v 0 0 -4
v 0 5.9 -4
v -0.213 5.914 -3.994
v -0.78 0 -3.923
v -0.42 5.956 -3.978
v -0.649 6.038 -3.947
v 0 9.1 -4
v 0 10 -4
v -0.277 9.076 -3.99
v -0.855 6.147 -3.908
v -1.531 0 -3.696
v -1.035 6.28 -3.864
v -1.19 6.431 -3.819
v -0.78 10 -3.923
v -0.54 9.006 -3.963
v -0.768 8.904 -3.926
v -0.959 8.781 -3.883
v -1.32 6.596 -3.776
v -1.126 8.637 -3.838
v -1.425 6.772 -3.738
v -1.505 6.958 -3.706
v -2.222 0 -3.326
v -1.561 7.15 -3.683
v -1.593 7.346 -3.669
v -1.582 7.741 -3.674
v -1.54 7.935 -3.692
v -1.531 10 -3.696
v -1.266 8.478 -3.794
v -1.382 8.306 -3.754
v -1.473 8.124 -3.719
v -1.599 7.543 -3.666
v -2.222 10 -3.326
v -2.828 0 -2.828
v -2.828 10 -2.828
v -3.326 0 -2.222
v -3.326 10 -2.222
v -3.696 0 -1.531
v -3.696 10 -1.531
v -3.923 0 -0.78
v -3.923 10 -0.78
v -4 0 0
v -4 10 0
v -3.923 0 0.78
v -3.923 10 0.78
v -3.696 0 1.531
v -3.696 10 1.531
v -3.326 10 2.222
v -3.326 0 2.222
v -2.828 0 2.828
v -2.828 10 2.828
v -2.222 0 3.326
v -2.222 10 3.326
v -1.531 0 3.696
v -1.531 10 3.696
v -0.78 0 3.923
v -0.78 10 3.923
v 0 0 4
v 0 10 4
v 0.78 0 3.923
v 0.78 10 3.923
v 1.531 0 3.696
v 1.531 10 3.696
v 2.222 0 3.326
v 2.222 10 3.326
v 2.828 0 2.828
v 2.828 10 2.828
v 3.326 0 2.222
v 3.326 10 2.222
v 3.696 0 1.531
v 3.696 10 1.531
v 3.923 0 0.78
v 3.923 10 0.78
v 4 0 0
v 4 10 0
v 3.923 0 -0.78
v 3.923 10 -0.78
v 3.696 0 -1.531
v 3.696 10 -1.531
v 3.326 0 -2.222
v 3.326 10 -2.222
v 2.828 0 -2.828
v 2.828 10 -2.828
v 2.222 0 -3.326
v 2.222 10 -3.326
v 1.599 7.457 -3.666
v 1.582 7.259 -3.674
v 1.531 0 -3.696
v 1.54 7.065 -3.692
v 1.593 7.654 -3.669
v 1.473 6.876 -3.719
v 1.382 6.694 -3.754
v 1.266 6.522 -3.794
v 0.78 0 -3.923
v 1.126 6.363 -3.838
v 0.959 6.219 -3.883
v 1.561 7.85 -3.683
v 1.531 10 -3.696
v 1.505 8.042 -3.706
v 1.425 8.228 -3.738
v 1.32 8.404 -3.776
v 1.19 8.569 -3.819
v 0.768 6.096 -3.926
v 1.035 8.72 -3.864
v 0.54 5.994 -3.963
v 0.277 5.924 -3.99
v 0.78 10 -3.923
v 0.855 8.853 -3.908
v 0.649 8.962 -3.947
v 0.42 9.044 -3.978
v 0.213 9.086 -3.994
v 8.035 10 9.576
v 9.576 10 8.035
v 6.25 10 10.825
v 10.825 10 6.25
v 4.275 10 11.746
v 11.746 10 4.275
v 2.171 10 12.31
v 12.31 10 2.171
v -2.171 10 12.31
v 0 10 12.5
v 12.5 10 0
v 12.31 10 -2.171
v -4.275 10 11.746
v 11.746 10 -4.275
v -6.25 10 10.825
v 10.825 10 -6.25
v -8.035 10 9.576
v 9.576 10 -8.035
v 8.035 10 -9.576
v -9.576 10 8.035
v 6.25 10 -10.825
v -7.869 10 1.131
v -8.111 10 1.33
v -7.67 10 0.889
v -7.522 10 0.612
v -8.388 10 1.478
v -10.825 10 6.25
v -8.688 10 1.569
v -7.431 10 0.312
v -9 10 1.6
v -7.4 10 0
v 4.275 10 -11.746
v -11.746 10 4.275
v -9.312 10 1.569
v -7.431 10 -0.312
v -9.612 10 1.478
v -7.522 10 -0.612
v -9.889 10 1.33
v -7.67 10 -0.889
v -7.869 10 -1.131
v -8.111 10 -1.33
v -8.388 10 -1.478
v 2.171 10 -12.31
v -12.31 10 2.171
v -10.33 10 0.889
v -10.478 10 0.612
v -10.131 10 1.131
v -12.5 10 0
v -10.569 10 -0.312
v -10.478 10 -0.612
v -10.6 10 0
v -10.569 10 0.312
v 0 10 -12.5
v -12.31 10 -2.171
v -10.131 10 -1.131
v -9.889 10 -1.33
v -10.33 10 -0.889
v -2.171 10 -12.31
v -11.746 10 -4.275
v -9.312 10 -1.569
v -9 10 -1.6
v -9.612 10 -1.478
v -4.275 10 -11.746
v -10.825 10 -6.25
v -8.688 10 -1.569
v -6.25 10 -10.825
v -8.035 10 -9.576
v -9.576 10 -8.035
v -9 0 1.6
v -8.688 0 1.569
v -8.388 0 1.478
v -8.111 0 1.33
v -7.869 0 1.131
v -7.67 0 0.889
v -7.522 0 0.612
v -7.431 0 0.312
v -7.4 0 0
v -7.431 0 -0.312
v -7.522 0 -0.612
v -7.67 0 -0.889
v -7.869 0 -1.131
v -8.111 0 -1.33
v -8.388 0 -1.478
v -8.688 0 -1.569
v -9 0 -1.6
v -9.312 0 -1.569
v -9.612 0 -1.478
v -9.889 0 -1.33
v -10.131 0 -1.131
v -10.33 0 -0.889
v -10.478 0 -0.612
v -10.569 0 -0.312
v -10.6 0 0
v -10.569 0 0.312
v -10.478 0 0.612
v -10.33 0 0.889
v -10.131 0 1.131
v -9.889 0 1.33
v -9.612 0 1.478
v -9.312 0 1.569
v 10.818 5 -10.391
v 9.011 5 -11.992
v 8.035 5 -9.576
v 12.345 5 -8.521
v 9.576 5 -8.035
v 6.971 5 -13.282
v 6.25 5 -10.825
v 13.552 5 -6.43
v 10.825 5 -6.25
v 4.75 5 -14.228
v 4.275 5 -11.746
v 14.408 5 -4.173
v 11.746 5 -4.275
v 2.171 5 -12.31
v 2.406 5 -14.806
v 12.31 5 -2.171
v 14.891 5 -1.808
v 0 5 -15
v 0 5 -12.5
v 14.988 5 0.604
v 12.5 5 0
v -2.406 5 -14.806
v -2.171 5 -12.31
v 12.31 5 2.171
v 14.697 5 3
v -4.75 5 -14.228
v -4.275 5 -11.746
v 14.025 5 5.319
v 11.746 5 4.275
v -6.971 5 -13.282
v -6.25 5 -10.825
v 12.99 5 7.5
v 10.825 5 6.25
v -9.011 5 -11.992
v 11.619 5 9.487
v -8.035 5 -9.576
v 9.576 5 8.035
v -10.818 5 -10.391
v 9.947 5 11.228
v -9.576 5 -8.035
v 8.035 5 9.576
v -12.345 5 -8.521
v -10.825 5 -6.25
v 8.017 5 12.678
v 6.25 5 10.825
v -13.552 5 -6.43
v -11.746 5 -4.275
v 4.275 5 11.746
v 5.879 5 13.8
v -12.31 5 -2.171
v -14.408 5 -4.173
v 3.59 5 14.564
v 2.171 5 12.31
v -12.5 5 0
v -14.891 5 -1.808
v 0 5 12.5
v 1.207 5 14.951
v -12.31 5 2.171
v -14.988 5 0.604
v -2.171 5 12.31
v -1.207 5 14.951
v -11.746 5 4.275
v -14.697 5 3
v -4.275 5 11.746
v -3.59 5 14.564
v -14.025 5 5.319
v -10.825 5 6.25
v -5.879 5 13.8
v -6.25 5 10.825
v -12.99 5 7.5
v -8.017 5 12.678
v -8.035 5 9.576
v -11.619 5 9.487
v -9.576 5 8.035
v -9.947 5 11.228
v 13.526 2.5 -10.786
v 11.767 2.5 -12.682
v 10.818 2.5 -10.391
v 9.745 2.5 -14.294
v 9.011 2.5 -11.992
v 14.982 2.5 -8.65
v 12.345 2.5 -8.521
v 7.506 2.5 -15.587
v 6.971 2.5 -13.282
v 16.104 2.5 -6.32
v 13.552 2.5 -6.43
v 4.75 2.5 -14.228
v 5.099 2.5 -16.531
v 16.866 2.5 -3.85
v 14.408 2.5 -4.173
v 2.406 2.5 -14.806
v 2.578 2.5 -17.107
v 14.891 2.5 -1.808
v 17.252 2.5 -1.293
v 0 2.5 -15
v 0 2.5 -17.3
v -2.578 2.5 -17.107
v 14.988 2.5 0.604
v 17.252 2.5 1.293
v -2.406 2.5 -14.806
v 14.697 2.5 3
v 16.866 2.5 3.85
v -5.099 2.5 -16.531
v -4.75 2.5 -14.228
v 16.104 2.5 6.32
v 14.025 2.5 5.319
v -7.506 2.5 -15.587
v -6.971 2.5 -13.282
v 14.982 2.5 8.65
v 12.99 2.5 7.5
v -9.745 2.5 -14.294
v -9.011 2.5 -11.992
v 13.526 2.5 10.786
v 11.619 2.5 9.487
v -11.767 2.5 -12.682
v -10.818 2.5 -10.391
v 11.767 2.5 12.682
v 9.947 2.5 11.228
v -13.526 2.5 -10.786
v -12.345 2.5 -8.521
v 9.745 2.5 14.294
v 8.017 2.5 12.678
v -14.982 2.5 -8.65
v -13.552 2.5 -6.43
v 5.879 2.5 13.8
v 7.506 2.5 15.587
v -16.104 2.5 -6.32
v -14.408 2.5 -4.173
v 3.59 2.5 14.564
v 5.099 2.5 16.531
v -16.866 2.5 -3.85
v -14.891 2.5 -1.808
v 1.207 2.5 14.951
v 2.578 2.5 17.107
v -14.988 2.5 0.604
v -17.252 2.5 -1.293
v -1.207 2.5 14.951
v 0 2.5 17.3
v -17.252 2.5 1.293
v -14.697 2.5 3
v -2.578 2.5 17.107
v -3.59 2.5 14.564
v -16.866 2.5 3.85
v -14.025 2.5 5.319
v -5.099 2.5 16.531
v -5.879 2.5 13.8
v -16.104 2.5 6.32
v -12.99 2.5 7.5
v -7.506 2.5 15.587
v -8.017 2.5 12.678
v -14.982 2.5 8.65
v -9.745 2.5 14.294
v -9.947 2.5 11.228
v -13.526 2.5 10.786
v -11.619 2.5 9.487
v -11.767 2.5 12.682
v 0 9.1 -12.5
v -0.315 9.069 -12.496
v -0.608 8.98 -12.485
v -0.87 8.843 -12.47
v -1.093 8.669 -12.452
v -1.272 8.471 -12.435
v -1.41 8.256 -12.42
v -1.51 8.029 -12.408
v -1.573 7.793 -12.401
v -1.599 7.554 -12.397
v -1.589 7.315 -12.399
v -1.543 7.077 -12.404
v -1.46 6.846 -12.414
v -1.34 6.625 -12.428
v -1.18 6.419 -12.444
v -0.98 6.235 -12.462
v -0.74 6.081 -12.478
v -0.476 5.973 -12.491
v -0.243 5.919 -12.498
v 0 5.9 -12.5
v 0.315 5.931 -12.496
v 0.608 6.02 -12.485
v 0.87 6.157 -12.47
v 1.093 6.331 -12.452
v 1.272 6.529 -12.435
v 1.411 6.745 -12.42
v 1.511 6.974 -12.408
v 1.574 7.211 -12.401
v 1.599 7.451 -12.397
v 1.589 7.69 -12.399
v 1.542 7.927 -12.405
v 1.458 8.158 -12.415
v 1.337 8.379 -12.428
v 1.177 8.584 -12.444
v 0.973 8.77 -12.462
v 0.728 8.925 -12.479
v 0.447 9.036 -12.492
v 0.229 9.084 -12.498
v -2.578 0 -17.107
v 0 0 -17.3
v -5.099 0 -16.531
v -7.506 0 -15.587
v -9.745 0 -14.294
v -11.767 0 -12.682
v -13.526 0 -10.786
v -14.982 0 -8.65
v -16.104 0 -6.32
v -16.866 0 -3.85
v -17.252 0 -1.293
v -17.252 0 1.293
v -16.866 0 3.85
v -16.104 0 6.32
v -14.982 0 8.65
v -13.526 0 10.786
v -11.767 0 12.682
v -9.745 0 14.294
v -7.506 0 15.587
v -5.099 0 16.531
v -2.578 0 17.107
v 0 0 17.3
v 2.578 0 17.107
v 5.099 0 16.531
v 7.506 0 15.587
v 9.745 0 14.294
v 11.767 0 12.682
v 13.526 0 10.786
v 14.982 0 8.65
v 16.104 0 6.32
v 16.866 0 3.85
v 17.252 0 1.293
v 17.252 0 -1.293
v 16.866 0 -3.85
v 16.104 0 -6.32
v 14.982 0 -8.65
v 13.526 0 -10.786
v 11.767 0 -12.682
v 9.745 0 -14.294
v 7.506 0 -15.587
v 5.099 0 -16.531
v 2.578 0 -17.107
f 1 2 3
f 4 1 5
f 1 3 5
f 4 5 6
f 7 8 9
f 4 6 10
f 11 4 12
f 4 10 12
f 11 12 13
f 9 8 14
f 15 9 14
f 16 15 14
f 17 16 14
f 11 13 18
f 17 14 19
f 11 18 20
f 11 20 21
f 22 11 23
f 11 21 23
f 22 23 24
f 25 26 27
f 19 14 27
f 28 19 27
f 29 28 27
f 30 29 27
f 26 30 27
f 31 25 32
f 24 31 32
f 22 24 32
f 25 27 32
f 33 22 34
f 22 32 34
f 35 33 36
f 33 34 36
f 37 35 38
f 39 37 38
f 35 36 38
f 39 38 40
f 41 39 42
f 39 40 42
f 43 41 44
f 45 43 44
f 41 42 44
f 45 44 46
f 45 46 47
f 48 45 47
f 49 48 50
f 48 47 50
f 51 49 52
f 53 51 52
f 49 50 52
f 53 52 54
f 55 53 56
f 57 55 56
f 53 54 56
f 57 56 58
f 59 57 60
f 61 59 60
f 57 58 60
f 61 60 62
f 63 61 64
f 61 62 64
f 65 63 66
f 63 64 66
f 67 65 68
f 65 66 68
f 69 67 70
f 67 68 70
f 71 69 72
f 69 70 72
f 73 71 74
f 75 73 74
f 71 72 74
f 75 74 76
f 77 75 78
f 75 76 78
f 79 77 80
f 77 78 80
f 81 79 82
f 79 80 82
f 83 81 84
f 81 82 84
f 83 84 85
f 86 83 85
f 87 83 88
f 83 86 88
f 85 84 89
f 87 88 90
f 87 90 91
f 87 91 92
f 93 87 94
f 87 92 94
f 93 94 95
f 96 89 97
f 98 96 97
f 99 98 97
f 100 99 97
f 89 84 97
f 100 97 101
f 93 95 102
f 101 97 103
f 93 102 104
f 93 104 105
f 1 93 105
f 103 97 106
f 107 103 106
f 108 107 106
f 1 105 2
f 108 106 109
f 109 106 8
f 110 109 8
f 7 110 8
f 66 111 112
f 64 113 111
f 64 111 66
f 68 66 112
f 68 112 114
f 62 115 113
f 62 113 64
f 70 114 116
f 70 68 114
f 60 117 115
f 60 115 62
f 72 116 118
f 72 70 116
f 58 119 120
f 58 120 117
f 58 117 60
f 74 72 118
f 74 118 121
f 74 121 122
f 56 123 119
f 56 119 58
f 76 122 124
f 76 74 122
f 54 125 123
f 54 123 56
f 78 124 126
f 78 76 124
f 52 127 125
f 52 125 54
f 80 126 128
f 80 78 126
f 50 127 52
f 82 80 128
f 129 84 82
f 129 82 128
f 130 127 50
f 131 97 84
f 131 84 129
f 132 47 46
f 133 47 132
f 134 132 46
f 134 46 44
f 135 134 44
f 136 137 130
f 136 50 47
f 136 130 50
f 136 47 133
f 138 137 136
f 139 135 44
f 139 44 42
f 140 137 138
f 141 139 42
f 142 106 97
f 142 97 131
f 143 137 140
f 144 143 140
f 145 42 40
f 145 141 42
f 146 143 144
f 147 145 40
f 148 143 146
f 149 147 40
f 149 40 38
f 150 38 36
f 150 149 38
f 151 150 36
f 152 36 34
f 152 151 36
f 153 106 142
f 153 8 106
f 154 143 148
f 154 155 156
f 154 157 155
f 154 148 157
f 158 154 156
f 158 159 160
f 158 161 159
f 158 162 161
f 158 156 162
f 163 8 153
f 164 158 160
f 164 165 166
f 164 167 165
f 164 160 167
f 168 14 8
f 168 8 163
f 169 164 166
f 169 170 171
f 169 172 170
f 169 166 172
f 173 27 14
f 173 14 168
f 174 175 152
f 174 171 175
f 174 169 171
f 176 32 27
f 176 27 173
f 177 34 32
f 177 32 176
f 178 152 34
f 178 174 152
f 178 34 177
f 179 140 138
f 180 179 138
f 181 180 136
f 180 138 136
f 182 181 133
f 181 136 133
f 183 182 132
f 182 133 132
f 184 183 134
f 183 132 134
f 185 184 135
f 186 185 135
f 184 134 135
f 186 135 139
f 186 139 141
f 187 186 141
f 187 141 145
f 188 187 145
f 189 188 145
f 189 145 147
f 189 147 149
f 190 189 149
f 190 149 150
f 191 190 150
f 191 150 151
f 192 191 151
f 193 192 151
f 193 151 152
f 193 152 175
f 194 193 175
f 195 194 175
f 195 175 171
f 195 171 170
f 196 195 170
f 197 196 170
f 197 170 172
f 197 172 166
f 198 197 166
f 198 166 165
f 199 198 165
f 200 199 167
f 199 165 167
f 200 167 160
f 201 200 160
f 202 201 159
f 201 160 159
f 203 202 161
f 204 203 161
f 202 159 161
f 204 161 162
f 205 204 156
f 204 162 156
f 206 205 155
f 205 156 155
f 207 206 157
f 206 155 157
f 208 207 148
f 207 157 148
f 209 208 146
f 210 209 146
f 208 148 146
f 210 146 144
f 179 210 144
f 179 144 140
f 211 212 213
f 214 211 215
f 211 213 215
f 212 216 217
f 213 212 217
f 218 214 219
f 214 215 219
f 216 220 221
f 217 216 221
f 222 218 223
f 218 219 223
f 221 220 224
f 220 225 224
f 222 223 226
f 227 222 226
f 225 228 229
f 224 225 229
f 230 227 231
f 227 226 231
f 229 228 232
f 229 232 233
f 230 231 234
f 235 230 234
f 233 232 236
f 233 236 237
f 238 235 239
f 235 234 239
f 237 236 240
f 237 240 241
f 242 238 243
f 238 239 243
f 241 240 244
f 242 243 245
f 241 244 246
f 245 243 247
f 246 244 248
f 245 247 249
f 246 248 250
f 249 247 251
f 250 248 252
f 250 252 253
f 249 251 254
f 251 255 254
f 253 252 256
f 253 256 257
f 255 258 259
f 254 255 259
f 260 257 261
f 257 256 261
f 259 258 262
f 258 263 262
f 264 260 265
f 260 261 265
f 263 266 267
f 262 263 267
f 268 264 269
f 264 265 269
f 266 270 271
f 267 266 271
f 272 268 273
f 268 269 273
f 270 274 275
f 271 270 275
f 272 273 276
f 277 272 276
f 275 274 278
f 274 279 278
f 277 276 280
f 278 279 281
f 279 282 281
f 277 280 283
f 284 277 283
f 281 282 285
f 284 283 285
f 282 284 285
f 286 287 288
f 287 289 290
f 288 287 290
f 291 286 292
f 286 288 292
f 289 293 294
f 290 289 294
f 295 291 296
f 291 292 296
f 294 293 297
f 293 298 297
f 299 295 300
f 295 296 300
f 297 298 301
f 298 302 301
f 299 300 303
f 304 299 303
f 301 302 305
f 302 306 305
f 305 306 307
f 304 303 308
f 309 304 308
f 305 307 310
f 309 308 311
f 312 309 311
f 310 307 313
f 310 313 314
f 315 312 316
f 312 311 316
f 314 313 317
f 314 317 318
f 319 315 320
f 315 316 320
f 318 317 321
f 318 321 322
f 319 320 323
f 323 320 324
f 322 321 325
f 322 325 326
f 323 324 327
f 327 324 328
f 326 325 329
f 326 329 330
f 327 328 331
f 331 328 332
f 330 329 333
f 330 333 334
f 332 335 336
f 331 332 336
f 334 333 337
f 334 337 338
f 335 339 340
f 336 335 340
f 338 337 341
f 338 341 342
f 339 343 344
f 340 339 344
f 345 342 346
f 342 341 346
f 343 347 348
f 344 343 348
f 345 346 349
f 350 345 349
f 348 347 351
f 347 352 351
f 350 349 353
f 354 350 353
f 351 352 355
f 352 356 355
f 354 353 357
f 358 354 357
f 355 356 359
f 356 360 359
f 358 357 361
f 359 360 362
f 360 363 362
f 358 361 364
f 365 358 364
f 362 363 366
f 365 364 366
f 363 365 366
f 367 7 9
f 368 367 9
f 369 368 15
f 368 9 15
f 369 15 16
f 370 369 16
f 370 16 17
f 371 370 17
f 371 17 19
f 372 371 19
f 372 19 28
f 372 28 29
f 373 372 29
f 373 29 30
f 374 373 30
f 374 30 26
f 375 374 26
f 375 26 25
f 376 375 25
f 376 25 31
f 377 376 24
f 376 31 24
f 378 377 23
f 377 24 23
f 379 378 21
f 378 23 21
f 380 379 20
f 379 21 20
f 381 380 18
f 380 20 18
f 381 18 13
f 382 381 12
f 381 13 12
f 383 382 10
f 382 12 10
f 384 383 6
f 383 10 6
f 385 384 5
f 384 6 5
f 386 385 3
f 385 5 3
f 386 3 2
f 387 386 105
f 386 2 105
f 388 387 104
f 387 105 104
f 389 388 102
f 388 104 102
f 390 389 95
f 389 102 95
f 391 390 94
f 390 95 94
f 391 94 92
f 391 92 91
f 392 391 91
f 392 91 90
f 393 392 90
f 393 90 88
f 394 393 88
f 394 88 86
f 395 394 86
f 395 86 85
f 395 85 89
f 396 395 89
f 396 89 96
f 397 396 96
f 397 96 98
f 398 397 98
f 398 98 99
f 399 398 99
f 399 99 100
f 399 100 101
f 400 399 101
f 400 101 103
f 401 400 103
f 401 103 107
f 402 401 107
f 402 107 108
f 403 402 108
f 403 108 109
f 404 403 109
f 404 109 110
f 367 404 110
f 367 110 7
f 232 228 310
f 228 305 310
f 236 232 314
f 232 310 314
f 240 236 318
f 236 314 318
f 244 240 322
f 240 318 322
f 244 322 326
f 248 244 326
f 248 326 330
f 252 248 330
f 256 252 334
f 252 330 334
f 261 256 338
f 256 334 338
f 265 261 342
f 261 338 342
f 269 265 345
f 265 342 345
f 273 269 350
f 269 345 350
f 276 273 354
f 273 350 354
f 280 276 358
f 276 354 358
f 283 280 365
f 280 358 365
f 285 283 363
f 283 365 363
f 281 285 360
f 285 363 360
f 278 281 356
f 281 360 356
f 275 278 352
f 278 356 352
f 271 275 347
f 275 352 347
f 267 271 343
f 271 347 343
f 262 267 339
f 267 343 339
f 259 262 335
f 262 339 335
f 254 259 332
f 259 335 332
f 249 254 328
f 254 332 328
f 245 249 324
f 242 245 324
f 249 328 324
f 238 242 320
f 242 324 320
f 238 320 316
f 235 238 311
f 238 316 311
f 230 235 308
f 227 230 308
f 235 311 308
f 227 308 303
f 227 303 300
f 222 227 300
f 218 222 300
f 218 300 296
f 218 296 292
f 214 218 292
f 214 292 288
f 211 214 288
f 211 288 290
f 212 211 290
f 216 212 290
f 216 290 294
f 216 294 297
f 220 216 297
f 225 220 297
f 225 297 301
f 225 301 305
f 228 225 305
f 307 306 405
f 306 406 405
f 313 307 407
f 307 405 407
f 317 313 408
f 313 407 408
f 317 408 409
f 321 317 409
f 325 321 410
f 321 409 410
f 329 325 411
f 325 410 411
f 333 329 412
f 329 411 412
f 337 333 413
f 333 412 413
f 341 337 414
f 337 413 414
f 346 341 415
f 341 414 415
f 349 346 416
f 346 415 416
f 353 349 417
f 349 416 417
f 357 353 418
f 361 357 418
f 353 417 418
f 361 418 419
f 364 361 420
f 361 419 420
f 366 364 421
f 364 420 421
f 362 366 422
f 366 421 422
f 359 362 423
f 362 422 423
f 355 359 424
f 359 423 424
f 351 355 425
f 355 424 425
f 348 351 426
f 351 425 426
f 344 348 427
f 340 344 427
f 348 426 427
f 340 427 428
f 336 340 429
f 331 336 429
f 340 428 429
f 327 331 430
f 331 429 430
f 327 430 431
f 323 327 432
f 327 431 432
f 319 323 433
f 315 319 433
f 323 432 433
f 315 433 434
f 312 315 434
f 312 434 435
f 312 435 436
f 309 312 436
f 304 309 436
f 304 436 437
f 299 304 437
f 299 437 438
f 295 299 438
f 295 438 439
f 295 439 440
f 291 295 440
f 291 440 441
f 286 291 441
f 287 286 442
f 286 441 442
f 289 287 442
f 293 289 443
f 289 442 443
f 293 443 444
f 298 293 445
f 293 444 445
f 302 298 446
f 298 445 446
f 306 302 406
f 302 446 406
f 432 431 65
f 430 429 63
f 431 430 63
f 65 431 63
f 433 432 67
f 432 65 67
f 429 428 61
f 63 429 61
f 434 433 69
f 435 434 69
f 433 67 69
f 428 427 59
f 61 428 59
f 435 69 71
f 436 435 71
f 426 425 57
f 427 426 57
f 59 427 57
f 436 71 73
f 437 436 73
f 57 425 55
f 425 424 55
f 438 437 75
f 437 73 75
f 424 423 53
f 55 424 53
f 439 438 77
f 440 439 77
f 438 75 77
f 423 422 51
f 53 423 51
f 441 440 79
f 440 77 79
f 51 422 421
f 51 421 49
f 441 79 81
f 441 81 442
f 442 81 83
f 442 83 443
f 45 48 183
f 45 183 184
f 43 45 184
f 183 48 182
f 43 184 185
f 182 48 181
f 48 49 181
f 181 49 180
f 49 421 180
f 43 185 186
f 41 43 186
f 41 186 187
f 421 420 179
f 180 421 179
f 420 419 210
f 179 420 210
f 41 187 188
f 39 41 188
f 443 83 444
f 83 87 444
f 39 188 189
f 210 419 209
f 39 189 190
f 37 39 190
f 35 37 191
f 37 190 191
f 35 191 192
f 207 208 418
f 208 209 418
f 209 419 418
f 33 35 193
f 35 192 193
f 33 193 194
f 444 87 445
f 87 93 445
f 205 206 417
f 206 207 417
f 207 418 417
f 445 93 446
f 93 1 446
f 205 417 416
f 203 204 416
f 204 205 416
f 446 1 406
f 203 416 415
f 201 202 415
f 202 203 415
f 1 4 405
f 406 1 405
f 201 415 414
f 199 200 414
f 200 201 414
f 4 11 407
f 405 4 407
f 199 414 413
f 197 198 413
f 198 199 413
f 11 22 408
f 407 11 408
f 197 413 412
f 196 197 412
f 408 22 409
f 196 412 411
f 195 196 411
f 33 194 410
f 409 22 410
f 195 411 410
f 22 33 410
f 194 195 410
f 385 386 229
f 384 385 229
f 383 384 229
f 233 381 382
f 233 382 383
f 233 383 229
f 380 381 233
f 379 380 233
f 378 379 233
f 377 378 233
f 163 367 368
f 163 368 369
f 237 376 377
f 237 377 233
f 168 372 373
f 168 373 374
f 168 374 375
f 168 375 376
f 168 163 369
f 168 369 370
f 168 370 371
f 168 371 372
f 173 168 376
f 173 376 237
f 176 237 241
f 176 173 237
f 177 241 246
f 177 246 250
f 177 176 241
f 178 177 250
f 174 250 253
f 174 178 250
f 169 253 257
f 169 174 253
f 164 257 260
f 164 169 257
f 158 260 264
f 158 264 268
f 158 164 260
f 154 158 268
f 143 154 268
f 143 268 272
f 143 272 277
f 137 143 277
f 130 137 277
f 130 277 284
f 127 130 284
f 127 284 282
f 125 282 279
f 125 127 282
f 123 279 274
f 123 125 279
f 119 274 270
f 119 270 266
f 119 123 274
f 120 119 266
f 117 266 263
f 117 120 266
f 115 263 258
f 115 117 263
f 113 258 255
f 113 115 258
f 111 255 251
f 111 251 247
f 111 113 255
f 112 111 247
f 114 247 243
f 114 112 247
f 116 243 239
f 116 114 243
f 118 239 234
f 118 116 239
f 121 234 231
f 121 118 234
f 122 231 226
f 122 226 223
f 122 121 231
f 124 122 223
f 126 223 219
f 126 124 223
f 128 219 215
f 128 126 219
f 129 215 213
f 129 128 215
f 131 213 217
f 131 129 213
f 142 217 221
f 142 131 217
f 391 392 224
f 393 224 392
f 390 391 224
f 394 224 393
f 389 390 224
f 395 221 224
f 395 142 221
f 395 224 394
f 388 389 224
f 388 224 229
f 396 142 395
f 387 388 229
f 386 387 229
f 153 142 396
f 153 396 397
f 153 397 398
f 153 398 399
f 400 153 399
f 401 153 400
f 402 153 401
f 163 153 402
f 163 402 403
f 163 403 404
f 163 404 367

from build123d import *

# Parameters (mm, degrees)
SKETCH_1_W          = 8.5
SKETCH_1_H          = 5
SKETCH_2_R          = 1.6
CUT_EXTRUDE_1_DEPTH = 27.43066401
SKETCH_3_R          = 1.6
CUT_EXTRUDE_2_DEPTH = 27.430664048


with BuildPart() as part:
    # ｽｹｯﾁ1 → 回転2 (revolve)
    with BuildSketch(Plane.XY, mode=Mode.PRIVATE) as revolve_2_sk:
        Polygon((-4, 0), (-4, 5), (-12.5, 5), (-15, 5), (-15, 2.5), (-17.3, 2.5), (-17.3, 0), align=None)
        with Locations((-8.25, 7.5)):
            Rectangle(SKETCH_1_W, SKETCH_1_H)
    revolve(revolve_2_sk.sketch.rotate(Axis((0, 0, 0), (0, 1, 0)), 270), axis=Axis((0, 0, 0), (0, 1, 0)))

    # ｽｹｯﾁ2 → ｶｯﾄ - 押し出し1 (cut, through all)
    with BuildSketch(Plane.XY):
        with Locations(Location((0, 7.5, 0), (0, 0, 90))):
            Circle(SKETCH_2_R)
    extrude(amount=-CUT_EXTRUDE_1_DEPTH, mode=Mode.SUBTRACT)

    # ｽｹｯﾁ3 → ｶｯﾄ - 押し出し2 (cut, through all)
    with BuildSketch(Plane(origin=(0, 10, 0), x_dir=(1, 0, 0), z_dir=(0, 1, 0))):
        with Locations(Location((-9, 0, 0), (0, 0, 270))):
            Circle(SKETCH_3_R)
    extrude(amount=-CUT_EXTRUDE_2_DEPTH, mode=Mode.SUBTRACT)


solid = part.part
